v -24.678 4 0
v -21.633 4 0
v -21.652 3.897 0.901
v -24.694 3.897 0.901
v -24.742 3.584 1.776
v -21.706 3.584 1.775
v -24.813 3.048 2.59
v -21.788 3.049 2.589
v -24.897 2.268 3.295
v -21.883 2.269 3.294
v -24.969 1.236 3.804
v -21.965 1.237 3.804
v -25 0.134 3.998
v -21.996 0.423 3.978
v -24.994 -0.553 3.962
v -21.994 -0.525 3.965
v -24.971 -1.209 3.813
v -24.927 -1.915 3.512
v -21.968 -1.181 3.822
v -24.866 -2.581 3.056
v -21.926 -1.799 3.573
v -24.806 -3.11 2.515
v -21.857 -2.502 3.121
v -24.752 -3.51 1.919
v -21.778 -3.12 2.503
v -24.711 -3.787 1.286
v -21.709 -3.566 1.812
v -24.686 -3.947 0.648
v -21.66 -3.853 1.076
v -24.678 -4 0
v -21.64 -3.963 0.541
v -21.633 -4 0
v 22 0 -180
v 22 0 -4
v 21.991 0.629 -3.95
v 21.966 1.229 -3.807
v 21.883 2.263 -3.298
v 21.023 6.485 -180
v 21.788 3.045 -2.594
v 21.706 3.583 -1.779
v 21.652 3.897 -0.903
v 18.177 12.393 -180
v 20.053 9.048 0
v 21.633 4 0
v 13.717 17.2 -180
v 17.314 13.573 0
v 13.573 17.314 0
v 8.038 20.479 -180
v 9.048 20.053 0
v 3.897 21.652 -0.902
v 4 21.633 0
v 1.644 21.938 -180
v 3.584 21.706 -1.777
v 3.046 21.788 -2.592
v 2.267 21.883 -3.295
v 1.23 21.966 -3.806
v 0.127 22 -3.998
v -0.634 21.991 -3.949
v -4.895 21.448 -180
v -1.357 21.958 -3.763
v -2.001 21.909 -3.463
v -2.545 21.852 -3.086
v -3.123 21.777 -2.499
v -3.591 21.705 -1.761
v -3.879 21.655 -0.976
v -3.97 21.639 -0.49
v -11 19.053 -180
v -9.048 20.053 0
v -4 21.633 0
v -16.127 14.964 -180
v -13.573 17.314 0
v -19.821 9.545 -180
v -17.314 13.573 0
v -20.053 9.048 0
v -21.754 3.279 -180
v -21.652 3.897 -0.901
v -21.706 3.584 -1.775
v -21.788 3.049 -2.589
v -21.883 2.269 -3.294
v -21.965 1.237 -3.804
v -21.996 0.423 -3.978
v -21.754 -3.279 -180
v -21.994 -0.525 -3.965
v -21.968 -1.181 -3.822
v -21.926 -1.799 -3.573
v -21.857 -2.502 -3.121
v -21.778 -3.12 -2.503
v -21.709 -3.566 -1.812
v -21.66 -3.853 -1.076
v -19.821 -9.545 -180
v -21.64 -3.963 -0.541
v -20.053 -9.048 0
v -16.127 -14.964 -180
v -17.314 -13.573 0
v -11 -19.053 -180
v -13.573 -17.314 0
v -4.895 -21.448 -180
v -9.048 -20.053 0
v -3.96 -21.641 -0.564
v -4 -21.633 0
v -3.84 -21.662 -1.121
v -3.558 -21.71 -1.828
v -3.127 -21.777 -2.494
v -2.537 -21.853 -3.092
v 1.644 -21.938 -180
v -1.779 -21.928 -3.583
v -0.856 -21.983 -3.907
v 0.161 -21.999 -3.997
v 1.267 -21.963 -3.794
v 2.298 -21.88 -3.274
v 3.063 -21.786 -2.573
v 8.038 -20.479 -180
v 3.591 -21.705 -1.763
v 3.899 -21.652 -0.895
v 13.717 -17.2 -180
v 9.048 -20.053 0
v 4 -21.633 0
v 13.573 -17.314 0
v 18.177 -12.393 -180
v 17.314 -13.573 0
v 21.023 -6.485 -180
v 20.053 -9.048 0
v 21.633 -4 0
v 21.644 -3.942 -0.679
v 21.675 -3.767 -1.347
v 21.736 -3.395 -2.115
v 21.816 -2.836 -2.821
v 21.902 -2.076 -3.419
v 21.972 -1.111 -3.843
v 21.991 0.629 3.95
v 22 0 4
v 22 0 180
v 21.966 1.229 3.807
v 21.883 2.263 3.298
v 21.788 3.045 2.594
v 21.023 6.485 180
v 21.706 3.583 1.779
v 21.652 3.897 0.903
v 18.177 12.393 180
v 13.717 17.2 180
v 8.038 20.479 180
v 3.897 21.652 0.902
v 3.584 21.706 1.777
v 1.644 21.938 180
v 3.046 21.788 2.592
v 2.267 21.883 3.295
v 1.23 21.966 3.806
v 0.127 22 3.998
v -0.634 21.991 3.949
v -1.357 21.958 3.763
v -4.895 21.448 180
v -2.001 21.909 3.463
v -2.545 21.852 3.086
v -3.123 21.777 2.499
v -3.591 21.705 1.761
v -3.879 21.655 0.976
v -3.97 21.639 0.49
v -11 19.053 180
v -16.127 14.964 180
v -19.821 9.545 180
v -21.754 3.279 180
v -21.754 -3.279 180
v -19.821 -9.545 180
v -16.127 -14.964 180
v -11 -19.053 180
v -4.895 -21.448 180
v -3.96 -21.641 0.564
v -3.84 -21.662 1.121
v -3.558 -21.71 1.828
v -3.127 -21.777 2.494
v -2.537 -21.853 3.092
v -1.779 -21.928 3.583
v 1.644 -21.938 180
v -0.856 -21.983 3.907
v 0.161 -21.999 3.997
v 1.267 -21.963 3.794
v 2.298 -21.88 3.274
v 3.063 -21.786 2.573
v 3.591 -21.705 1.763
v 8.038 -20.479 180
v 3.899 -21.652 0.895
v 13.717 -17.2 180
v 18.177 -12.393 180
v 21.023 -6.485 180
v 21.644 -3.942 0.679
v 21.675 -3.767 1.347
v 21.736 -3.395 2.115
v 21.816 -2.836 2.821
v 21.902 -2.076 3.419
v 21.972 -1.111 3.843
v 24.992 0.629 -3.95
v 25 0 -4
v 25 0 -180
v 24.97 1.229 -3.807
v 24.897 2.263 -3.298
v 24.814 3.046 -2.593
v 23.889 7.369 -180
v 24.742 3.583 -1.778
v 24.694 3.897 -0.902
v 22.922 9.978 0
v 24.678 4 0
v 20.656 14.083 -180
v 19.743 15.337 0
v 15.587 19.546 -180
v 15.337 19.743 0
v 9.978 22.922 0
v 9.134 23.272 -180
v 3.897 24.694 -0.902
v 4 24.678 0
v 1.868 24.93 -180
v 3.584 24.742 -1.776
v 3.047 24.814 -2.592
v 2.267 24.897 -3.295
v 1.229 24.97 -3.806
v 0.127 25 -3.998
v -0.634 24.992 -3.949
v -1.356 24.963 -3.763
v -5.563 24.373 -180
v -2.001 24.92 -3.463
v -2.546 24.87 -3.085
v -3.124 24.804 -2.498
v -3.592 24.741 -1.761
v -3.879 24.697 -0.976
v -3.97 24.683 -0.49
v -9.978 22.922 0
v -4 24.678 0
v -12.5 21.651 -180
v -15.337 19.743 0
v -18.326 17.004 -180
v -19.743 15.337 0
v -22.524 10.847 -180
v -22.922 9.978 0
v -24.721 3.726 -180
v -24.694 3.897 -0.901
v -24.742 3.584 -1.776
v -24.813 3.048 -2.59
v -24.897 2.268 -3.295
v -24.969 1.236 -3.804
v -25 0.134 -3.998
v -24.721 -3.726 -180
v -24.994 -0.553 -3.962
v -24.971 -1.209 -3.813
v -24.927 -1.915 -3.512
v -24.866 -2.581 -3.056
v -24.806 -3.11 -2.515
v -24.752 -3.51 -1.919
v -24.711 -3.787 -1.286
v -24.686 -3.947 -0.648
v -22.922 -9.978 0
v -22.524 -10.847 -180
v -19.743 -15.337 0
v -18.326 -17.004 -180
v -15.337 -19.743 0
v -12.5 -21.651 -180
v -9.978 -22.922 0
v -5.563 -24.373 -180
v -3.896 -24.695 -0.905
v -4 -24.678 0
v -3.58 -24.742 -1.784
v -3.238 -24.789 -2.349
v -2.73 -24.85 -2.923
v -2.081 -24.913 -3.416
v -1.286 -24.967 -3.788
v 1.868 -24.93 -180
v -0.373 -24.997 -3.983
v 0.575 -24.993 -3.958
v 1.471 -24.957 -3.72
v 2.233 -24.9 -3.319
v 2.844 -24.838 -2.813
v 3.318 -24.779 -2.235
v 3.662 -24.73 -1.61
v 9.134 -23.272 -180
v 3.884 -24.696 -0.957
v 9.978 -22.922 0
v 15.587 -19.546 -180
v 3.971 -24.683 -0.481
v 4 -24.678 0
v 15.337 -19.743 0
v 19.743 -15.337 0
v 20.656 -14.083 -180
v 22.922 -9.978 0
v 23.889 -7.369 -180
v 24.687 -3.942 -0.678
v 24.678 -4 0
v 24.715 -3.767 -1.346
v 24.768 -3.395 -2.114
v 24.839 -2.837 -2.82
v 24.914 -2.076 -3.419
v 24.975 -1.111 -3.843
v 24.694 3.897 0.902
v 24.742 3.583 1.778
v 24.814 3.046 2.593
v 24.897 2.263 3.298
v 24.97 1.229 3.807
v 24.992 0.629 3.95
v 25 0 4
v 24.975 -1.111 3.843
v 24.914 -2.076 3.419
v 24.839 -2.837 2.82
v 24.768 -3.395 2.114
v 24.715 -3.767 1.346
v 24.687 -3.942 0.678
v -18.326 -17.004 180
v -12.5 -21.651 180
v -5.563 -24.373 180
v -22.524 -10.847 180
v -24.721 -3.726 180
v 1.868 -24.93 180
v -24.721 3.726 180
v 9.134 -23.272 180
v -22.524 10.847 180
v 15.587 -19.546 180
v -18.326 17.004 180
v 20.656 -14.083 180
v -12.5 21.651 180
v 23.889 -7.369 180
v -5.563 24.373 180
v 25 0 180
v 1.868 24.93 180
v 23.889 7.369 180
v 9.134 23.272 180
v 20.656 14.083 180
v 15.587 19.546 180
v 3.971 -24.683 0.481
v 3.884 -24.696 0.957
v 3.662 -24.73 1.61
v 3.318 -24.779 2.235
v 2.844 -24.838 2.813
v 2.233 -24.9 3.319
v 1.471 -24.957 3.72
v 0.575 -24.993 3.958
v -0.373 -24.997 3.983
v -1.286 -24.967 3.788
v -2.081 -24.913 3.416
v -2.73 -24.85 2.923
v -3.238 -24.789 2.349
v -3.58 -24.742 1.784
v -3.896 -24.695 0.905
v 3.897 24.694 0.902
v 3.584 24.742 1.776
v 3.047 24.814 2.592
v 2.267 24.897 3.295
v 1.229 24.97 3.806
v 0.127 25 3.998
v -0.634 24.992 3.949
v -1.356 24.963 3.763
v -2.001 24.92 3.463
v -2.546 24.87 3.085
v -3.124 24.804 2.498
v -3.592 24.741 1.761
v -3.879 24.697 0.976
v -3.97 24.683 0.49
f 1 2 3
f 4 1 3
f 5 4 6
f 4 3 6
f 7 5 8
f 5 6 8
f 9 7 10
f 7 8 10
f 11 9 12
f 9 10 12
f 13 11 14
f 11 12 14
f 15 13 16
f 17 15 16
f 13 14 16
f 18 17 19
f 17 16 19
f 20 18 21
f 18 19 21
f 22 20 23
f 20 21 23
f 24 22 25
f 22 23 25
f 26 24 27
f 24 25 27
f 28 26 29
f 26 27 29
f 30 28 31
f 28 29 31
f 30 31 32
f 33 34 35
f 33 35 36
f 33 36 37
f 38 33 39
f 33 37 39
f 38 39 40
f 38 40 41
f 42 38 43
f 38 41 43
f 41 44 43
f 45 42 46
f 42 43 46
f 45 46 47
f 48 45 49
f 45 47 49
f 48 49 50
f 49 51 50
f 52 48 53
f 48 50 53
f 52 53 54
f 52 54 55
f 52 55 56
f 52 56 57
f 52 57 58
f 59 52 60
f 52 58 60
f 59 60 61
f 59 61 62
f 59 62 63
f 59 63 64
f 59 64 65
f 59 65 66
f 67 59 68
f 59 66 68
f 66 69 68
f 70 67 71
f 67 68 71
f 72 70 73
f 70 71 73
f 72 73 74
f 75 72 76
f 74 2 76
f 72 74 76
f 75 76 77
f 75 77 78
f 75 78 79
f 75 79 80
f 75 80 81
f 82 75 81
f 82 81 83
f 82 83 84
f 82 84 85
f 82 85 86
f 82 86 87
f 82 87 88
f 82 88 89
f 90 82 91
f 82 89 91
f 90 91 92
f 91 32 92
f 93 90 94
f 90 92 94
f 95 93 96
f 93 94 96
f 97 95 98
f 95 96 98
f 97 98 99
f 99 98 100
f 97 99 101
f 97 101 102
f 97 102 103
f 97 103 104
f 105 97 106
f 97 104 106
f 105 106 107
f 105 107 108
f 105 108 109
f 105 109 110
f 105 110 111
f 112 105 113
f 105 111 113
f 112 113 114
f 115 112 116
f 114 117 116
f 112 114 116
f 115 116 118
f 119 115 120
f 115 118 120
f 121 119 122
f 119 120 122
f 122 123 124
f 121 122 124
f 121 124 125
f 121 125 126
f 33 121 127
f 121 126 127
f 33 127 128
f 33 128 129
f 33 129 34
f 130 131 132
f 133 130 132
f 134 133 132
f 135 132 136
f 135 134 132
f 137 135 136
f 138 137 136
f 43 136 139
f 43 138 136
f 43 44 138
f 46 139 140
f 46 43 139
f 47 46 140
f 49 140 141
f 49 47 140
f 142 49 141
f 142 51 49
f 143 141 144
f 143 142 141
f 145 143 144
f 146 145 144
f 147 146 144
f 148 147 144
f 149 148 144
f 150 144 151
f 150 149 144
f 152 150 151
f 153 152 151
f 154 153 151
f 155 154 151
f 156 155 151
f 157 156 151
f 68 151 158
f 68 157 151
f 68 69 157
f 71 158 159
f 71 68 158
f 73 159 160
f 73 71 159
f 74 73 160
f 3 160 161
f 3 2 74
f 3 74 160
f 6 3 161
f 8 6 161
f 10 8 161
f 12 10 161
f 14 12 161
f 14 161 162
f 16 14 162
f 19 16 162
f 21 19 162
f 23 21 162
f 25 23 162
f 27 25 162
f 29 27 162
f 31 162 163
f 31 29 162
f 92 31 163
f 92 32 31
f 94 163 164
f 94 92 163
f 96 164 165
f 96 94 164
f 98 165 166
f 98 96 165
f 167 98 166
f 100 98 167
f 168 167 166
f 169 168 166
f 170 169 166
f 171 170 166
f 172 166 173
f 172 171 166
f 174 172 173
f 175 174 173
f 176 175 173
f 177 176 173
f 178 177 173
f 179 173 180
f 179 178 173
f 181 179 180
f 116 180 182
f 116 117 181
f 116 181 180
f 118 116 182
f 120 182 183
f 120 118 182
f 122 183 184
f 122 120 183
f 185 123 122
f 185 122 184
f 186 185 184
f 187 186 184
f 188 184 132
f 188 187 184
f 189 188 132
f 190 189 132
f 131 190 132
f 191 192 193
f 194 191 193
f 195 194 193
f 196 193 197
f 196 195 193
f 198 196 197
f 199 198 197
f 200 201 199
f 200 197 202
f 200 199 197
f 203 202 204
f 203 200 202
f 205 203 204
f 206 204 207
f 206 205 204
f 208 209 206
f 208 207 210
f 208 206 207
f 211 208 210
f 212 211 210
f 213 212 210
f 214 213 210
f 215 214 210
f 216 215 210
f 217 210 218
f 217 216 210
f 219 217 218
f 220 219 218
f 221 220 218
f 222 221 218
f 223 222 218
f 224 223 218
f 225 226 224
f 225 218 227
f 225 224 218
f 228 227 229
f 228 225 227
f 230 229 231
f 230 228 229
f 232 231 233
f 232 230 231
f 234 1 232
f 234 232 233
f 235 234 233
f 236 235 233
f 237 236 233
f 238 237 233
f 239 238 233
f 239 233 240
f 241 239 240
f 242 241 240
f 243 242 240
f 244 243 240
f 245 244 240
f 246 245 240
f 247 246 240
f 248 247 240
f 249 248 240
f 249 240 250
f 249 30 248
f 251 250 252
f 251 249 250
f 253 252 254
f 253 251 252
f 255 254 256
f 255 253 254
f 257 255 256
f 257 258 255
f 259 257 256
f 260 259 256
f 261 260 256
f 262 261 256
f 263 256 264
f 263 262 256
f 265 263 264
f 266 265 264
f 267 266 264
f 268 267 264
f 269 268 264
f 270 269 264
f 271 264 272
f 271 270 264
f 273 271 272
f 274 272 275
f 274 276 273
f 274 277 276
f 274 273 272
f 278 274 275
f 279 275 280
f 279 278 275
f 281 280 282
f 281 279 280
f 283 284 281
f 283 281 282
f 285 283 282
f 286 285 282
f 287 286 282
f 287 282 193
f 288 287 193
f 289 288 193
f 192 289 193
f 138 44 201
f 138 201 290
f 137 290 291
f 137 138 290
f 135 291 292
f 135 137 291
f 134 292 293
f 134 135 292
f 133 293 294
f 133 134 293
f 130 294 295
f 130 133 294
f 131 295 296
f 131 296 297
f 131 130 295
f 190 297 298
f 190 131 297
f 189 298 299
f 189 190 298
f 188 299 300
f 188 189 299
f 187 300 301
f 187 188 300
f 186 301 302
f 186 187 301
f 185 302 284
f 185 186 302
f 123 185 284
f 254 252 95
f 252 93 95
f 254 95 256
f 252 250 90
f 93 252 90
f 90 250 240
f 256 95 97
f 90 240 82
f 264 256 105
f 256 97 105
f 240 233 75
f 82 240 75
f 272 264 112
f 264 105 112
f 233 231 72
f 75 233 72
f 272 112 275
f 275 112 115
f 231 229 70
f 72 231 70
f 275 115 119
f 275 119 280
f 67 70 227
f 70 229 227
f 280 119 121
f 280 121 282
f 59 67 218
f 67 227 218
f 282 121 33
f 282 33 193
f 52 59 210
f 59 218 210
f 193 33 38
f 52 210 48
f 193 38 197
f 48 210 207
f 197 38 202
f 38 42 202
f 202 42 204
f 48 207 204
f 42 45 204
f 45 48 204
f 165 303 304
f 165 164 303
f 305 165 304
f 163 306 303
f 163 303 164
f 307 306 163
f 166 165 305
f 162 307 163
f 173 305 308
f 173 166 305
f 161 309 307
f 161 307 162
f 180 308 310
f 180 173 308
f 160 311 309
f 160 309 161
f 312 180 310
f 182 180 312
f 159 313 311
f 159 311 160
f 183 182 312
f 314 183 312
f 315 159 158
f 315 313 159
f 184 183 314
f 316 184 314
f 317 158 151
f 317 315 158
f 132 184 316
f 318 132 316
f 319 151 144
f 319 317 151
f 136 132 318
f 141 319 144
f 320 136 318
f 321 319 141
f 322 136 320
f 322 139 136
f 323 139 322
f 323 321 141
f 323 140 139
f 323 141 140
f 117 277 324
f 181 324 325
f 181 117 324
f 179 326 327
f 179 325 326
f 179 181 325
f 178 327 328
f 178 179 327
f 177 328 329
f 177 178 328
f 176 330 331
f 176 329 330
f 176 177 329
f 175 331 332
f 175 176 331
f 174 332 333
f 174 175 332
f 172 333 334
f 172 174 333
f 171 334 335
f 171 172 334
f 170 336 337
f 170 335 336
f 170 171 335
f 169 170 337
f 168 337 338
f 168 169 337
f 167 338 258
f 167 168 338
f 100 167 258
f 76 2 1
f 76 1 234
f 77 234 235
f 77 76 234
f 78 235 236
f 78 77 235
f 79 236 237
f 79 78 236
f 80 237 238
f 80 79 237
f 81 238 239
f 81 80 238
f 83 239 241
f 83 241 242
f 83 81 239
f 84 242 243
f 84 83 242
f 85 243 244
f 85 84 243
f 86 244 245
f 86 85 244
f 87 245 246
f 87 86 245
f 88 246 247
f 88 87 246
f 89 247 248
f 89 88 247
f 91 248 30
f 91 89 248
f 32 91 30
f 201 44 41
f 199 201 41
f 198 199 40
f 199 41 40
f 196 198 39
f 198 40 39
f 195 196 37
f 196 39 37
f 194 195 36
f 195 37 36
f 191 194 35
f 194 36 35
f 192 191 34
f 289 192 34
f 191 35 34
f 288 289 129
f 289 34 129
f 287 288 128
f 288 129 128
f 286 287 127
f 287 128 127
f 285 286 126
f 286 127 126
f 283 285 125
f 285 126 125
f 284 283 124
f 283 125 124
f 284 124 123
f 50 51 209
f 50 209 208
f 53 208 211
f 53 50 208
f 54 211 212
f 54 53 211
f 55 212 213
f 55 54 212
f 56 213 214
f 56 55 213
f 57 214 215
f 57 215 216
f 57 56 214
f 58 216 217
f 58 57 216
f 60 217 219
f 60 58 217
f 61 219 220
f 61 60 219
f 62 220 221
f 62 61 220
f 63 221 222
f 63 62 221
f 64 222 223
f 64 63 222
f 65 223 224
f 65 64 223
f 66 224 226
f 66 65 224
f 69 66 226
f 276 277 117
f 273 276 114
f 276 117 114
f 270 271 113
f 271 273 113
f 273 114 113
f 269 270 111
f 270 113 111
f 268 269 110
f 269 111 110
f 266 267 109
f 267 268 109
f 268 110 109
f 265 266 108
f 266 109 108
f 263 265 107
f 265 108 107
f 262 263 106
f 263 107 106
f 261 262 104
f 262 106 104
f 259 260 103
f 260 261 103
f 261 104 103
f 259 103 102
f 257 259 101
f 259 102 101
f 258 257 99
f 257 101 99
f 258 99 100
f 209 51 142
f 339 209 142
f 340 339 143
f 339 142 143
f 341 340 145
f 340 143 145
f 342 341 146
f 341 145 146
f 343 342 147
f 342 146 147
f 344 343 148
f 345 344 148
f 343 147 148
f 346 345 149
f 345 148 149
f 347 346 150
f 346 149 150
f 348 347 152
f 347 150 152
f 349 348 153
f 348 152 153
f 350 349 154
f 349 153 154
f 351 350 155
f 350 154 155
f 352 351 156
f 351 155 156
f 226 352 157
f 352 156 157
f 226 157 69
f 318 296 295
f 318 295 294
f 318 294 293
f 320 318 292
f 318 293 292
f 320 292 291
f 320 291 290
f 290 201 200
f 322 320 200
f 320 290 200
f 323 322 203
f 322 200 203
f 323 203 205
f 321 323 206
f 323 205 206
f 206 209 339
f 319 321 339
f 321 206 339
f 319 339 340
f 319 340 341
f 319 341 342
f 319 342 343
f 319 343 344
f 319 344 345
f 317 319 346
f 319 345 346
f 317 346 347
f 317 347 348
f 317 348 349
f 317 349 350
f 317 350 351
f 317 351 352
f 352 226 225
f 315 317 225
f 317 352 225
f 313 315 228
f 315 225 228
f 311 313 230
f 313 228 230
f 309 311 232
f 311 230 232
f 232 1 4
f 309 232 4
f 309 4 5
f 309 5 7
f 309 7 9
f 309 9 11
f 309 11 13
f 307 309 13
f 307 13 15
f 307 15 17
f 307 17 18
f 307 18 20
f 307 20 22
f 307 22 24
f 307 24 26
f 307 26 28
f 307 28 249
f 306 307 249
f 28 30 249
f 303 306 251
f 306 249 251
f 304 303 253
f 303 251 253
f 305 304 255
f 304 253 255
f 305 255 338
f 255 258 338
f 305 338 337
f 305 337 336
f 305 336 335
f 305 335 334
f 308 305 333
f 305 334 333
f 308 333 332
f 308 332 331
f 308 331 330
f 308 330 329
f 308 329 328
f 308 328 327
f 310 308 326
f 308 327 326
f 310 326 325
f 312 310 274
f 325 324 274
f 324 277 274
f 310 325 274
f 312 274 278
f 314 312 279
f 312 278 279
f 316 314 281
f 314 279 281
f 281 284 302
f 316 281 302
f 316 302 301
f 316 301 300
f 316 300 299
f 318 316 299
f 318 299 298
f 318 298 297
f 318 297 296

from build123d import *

# Parameters (mm, degrees)
F0_R     = 25
F0_R_2   = 22
F1_DEPTH = 90
F2_DEPTH = 90
F3_R     = 4
F4_DEPTH = 25
F5_DEPTH = 25
F6_R     = 4
F7_DEPTH = 25
F8_DEPTH = 25


# Not quite as in the source:
# - a feature names something its author has since deleted; it is built from what else it names


with BuildPart() as f1:
    # F0 (on Top) → F1 (new body)
    with BuildSketch(Plane.XY):
        Circle(F0_R)
        Circle(F0_R_2, mode=Mode.SUBTRACT)
    extrude(amount=F1_DEPTH)

    # F2 (add): a face of the model
    f2_faces = [f1.faces().sort_by_distance(p)[0] for p in [
        (-24.2928932188, 0, 90),
    ]]
    extrude(f2_faces, amount=F2_DEPTH)

    # F3 (on Right) → F4 (cut)
    with BuildSketch(Plane.YZ):
        Circle(F3_R)
    extrude(amount=F4_DEPTH, mode=Mode.SUBTRACT)

    # F3 (on Right) → F5 (cut)
    with BuildSketch(Plane.YZ):
        Circle(F3_R)
    extrude(amount=-F5_DEPTH, mode=Mode.SUBTRACT)

    # F6 (on Front) → F7 (cut)
    with BuildSketch(Plane.XZ):
        Circle(F6_R)
    extrude(amount=F7_DEPTH, mode=Mode.SUBTRACT)

    # F6 (on Front) → F8 (cut)
    with BuildSketch(Plane.XZ):
        Circle(F6_R)
    extrude(amount=-F8_DEPTH, mode=Mode.SUBTRACT)

    # F9: F1 across plane


with BuildPart() as f1_1:
    add(f1.part)
    add(f1.part.mirror(Plane.XY))


solid = f1_1.part
